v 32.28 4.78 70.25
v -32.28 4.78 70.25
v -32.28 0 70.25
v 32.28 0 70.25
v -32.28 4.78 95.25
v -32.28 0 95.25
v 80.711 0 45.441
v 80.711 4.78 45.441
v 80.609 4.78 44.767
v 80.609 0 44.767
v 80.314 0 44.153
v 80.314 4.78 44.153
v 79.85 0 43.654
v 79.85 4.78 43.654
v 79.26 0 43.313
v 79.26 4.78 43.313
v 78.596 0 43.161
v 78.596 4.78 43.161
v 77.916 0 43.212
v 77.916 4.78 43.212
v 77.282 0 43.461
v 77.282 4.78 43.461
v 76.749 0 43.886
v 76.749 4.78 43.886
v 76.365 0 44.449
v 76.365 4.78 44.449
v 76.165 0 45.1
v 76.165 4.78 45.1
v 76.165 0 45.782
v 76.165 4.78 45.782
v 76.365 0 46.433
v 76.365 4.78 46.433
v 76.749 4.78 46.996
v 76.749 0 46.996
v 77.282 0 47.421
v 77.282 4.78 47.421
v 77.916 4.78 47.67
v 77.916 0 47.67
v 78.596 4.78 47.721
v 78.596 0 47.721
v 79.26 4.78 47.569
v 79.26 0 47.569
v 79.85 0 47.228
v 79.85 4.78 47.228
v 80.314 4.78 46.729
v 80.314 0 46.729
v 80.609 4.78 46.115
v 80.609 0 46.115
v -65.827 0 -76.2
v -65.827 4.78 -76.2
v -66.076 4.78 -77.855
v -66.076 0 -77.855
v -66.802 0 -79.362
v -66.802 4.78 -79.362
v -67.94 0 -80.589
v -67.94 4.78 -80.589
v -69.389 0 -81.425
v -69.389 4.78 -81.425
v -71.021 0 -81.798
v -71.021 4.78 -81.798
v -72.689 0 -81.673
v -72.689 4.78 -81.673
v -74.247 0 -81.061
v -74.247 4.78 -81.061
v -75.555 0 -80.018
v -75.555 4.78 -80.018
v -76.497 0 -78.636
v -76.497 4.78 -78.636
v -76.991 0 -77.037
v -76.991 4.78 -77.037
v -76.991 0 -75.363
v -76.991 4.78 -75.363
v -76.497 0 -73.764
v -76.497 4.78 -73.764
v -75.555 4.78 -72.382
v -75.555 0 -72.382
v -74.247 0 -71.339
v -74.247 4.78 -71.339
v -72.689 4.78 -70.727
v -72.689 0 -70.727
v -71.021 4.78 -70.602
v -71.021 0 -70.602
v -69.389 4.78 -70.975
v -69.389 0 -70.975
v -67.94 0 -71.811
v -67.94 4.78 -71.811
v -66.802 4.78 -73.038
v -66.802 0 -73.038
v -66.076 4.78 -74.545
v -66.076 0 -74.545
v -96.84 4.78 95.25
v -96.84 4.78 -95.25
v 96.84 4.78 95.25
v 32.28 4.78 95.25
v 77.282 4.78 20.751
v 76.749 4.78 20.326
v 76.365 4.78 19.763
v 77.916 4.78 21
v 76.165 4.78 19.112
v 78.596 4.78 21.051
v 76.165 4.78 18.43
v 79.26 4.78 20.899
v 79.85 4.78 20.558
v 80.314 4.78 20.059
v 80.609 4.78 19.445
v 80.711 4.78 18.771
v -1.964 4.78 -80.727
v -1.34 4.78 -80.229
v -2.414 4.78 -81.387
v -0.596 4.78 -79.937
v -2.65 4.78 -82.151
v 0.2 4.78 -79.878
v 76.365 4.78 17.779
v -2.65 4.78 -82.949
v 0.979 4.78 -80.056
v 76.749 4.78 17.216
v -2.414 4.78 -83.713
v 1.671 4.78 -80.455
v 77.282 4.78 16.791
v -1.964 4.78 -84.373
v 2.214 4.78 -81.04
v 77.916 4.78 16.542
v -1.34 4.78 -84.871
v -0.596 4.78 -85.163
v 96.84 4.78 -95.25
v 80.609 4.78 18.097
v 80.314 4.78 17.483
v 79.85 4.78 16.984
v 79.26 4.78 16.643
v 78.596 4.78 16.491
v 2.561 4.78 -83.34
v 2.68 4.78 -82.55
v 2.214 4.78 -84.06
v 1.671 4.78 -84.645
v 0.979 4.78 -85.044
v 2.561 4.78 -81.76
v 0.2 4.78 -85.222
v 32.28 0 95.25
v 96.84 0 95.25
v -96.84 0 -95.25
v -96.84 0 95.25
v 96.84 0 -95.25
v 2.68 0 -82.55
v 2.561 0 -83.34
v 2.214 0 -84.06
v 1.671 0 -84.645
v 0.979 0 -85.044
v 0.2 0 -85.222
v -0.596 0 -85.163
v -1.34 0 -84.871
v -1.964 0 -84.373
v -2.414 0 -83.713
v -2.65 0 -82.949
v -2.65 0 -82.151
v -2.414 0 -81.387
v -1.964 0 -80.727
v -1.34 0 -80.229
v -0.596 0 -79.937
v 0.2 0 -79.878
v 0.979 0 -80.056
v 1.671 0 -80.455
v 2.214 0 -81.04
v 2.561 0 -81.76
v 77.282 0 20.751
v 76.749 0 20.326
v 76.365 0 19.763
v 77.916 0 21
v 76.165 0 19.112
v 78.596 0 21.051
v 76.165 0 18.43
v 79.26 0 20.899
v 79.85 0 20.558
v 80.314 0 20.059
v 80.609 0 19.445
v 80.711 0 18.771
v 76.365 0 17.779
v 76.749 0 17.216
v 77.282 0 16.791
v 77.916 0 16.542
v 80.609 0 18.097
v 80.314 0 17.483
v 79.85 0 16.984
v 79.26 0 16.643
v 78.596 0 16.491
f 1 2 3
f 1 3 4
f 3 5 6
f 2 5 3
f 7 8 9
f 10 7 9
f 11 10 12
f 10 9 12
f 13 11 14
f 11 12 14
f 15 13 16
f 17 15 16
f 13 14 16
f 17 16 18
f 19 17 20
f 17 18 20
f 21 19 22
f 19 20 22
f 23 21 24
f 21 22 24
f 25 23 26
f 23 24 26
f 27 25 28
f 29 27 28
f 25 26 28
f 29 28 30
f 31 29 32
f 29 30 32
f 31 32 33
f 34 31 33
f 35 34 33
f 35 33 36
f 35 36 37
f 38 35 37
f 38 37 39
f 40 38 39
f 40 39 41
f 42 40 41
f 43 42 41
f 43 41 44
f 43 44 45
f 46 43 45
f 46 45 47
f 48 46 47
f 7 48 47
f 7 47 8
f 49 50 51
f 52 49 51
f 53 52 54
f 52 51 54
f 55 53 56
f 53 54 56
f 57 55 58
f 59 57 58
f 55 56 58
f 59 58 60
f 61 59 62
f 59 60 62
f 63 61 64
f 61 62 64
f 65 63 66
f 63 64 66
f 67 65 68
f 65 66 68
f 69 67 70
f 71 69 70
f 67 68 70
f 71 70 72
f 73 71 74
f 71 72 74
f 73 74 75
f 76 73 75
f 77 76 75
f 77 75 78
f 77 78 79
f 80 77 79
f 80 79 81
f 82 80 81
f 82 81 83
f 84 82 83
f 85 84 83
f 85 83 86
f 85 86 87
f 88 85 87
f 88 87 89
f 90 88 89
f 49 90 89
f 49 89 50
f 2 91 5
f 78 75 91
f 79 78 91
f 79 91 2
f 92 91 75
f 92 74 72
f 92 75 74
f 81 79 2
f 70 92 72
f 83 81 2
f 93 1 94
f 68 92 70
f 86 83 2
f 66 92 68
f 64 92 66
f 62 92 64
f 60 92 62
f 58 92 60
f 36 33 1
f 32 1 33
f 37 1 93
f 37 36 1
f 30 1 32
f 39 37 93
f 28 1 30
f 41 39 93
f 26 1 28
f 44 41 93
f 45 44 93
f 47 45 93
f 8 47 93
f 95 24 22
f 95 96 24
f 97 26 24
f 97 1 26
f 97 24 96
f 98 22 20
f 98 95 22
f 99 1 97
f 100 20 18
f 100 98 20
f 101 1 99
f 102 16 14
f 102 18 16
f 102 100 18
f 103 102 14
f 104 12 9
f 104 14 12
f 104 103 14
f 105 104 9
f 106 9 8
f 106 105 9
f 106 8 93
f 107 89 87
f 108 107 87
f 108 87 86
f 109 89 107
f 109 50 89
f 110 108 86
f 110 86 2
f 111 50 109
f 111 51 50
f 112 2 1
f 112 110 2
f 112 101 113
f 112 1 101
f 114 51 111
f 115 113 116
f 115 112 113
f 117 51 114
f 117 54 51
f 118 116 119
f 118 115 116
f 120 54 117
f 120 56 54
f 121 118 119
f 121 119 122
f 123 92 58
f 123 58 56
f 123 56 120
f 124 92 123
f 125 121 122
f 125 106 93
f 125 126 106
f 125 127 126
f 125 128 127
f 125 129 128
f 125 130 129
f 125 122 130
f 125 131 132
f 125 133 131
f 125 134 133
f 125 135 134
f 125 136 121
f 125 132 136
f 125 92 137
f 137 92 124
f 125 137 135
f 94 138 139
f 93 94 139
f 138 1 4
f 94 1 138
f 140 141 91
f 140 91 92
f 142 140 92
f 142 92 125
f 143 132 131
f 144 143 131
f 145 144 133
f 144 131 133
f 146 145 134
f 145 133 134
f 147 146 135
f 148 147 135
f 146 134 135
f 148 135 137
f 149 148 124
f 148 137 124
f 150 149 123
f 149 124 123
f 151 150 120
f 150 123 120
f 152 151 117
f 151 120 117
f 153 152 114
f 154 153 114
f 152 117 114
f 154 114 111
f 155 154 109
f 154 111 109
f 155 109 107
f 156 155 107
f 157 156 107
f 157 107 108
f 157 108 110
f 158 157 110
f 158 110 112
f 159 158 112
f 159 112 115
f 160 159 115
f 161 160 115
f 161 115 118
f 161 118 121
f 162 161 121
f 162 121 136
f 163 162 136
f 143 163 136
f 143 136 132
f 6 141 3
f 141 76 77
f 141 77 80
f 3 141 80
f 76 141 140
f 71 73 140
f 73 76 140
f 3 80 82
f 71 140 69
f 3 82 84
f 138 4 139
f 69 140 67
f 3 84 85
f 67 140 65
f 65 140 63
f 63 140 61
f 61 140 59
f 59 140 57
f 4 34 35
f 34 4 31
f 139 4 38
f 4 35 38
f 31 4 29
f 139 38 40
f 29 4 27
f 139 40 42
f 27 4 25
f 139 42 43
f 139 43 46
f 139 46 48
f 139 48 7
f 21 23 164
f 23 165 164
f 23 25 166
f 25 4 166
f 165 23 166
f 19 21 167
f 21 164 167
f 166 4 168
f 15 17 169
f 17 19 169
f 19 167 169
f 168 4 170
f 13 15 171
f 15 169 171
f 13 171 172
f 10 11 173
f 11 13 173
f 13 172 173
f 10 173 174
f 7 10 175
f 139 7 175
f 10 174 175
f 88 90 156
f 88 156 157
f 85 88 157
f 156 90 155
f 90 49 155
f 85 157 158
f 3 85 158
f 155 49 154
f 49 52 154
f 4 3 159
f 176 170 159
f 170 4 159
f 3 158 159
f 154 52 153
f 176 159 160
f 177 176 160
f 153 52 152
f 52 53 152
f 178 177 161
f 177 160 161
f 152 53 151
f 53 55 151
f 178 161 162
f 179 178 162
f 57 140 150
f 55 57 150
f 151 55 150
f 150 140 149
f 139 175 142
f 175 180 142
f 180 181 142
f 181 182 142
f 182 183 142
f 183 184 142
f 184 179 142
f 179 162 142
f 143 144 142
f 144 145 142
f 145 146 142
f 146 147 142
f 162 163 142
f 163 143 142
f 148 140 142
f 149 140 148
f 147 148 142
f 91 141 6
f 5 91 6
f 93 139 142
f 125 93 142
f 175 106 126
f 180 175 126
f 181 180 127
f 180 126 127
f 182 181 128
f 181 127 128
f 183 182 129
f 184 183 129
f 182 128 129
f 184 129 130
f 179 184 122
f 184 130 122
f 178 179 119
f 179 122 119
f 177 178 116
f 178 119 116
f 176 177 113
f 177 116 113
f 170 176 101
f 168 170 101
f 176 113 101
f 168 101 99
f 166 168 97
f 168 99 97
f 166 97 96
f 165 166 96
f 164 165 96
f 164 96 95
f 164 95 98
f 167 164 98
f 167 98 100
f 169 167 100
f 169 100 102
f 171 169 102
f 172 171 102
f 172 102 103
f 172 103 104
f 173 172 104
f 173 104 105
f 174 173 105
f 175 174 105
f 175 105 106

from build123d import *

# Parameters (mm, degrees)
SKETCH1_W           = 193.68
SKETCH1_H           = 190.5
BOSS_EXTRUDE1_DEPTH = 4.78
SKETCH2_R           = 2.6797
CUT_EXTRUDE1_DEPTH  = 5.78
CUT_EXTRUDE2_DEPTH  = 5.78
SKETCH5_R           = 2.286
SKETCH5_R_2         = 5.6134
CUT_EXTRUDE3_DEPTH  = 5.78


with BuildPart() as part:
    # Sketch1 → Boss-Extrude1 (new body)
    with BuildSketch(Plane(origin=(0, 0, 0), x_dir=(1, 0, 0), z_dir=(0, 1, 0))):
        Rectangle(SKETCH1_W, SKETCH1_H)
    extrude(amount=BOSS_EXTRUDE1_DEPTH)

    # Sketch2 → Cut-Extrude1 (cut, through all)
    with BuildSketch(Plane(origin=(0, 4.78, 0), x_dir=(1, 0, 0), z_dir=(0, 1, 0))):
        with Locations((0, 82.55)):
            Circle(SKETCH2_R)
    extrude(amount=-CUT_EXTRUDE1_DEPTH, mode=Mode.SUBTRACT)

    # Sketch3 → Cut-Extrude2 (cut, through all)
    with BuildSketch(Plane(origin=(0, 4.78, 0), x_dir=(1, 0, 0), z_dir=(0, 1, 0))):
        Polygon((0, -95.25), (-32.28, -95.25), (-32.28, -70.249999962), (32.28, -70.249999962), (32.28, -95.25), align=None)
    extrude(amount=-CUT_EXTRUDE2_DEPTH, mode=Mode.SUBTRACT)

    # Sketch5 → Cut-Extrude3 (cut, through all)
    with BuildSketch(Plane(origin=(0, 4.78, 0), x_dir=(1, 0, 0), z_dir=(0, 1, 0))):
        with Locations((78.425, -18.77099)):
            Circle(SKETCH5_R)
        with Locations((78.425, -45.44099)):
            Circle(SKETCH5_R)
        with Locations((-71.44, 76.2)):
            Circle(SKETCH5_R_2)
    extrude(amount=-CUT_EXTRUDE3_DEPTH, mode=Mode.SUBTRACT)


solid = part.part
